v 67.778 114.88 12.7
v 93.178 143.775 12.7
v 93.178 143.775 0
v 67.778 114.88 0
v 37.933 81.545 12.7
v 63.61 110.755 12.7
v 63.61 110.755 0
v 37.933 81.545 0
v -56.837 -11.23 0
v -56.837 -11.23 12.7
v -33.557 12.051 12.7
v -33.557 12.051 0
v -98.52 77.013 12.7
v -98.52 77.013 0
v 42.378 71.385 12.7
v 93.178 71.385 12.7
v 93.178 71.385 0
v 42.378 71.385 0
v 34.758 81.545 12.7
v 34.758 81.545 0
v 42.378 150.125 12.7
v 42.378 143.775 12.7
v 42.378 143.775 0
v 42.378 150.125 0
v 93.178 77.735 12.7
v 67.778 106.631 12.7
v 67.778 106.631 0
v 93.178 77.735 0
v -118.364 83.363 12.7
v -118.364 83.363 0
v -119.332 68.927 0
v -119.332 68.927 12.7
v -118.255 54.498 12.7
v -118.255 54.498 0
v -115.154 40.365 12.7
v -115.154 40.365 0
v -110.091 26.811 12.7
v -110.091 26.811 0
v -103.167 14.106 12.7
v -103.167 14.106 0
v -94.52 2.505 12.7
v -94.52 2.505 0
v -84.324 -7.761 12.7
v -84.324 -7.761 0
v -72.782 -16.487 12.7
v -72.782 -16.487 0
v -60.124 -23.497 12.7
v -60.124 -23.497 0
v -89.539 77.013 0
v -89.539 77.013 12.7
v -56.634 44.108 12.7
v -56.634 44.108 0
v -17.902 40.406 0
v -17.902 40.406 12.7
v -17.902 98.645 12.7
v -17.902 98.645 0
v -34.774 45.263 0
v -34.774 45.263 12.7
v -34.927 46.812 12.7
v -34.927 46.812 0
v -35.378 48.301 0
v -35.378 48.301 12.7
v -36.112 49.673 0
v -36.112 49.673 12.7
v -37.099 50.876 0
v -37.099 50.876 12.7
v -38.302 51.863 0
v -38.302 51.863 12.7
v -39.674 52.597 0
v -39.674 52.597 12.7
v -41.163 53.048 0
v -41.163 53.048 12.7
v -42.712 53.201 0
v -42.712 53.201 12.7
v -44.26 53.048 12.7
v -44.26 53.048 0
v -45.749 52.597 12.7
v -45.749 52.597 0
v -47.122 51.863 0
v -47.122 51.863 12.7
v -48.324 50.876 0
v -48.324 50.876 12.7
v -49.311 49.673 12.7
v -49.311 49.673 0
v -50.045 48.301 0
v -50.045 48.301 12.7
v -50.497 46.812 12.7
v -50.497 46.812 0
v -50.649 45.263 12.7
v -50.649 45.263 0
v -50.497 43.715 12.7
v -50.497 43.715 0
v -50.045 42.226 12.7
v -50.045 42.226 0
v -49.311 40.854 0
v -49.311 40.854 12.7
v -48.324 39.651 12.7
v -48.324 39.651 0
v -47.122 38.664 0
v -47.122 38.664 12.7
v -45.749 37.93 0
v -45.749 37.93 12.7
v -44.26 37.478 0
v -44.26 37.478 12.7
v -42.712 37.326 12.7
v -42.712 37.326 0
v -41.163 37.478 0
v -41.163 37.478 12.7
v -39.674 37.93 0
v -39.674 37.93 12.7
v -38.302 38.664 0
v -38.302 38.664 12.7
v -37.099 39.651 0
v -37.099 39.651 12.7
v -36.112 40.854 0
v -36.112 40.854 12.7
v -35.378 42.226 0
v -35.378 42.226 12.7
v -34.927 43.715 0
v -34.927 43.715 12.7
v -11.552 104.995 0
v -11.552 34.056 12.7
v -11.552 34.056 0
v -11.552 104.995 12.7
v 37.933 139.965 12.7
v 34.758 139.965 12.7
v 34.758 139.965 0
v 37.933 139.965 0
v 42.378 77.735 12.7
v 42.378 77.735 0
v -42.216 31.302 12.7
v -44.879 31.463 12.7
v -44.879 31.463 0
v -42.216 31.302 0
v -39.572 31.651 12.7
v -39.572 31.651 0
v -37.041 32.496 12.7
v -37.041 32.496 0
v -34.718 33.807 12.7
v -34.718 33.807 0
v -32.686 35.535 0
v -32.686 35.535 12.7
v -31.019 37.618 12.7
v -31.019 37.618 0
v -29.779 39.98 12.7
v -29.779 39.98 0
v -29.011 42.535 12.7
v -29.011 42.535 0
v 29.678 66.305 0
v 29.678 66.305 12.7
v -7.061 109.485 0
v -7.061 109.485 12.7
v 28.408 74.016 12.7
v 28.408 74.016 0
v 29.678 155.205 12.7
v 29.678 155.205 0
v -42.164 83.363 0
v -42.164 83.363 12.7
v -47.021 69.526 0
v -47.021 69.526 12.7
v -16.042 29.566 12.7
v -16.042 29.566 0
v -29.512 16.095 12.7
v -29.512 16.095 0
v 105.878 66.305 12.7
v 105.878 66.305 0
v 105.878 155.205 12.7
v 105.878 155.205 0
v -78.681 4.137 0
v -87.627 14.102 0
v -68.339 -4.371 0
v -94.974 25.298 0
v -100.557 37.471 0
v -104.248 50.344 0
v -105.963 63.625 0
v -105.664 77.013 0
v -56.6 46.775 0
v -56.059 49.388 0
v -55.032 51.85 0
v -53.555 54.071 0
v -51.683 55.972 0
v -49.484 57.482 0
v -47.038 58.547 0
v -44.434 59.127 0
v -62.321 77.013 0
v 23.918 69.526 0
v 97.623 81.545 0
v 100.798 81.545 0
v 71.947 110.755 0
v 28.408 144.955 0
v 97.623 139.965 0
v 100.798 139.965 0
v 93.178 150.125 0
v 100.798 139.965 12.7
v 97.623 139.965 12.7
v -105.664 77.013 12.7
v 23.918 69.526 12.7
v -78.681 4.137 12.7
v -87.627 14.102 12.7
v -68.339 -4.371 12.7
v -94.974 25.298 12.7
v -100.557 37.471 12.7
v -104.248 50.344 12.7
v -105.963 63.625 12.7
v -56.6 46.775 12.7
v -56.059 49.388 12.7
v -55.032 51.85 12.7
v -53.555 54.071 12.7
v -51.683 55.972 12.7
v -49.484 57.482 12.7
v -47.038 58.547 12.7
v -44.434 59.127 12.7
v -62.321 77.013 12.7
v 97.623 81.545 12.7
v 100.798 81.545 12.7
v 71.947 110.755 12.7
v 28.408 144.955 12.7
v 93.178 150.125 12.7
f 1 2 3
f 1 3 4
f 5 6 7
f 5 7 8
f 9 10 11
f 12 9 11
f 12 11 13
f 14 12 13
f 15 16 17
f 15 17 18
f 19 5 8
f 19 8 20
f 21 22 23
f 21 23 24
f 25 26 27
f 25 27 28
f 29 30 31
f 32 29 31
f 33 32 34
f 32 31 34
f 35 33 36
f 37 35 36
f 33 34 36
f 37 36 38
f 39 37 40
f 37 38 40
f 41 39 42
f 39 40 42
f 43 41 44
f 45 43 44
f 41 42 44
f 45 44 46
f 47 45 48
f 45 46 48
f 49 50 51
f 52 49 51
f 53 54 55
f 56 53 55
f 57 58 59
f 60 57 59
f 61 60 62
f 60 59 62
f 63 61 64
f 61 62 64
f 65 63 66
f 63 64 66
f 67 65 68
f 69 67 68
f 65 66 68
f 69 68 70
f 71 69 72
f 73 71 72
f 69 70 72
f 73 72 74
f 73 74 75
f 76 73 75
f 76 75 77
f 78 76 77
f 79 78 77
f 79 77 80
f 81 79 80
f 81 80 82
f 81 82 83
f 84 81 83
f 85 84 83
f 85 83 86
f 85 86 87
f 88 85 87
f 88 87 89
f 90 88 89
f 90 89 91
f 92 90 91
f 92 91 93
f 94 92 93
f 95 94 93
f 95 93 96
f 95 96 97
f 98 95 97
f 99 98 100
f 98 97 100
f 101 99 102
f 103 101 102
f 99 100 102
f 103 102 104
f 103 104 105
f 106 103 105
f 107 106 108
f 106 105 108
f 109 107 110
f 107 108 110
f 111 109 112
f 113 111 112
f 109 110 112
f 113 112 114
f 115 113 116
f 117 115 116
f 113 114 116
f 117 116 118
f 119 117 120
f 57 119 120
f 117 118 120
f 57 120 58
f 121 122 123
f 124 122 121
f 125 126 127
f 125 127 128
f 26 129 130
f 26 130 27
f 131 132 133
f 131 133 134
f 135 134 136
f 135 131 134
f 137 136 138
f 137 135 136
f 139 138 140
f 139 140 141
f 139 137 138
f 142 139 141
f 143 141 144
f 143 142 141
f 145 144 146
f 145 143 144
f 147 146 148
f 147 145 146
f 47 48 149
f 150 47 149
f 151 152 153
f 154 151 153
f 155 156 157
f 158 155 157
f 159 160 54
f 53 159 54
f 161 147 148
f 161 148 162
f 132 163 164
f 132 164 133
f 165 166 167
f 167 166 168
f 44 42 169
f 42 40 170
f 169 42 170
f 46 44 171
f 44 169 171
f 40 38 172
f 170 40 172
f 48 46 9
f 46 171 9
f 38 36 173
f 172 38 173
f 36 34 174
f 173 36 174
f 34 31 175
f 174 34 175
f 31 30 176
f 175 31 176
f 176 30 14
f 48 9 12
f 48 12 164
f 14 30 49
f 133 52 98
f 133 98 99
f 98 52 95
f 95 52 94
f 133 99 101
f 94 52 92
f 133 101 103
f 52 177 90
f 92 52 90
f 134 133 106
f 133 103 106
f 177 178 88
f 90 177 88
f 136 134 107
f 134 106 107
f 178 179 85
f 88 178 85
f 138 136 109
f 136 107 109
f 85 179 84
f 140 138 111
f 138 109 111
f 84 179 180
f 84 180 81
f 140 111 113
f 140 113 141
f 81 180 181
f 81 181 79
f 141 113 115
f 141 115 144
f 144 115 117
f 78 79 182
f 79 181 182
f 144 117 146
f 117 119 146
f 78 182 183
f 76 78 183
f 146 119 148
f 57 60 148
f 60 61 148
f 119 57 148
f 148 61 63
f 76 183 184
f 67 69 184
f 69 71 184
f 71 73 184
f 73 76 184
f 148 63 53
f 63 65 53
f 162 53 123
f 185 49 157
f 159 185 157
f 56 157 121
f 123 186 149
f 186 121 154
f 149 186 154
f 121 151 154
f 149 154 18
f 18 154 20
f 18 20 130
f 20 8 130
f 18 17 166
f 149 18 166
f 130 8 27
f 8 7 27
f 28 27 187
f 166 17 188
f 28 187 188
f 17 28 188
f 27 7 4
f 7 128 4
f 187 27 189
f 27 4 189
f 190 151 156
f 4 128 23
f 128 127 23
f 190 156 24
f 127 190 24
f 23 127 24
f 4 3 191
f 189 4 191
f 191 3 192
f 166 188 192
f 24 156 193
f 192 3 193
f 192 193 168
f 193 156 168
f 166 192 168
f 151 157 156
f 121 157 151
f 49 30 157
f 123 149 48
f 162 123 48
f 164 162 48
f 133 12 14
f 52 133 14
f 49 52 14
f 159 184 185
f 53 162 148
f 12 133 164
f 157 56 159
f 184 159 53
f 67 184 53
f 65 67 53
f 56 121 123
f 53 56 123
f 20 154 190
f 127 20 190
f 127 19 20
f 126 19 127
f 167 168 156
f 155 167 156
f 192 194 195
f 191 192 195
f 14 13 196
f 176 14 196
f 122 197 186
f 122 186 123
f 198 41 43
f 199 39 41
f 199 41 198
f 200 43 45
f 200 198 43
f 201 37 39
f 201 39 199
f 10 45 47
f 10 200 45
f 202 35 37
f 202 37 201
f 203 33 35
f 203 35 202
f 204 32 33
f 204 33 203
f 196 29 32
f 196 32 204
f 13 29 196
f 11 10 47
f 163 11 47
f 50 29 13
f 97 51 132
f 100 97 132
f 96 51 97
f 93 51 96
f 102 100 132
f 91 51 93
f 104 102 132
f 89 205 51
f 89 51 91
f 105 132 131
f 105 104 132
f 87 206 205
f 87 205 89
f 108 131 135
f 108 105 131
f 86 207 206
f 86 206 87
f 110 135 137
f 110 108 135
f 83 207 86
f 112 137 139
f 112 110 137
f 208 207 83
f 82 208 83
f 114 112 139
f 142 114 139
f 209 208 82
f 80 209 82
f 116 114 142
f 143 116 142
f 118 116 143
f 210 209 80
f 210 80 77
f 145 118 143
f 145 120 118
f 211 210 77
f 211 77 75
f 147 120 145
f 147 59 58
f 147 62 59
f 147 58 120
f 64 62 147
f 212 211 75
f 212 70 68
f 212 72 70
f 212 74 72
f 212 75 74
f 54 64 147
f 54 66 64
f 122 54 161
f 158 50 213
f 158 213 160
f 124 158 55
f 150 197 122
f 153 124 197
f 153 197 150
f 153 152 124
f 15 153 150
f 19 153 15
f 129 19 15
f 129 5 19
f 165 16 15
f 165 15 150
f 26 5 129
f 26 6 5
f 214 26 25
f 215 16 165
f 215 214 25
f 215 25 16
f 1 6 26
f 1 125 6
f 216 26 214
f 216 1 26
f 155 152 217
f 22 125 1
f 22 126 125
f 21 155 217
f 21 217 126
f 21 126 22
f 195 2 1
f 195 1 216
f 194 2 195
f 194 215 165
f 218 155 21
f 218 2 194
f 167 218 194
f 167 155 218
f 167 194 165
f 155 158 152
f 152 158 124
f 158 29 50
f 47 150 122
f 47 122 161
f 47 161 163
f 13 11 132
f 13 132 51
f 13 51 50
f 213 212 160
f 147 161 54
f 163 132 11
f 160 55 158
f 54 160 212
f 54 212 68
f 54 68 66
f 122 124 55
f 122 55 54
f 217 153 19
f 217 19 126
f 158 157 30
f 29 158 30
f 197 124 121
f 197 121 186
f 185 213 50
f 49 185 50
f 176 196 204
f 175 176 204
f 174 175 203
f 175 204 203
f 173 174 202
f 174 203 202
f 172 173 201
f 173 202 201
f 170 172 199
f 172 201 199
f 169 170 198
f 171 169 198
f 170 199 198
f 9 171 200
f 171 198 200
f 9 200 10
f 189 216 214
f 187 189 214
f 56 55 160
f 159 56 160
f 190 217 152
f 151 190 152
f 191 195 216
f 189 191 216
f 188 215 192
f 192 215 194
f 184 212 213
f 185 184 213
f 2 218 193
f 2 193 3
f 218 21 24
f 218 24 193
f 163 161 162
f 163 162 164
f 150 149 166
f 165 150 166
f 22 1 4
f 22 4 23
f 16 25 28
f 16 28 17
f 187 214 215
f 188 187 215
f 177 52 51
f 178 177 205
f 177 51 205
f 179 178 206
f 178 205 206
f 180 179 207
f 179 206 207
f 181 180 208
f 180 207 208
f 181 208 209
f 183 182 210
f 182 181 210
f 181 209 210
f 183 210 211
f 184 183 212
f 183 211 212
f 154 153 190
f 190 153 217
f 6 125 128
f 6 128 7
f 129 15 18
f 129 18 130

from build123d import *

# Parameters (mm, degrees)
BOSS_EXTRUDE1_DEPTH = 12.7
SKETCH2_R           = 7.9375
CUT_EXTRUDE1_DEPTH  = 25.4
CUT_EXTRUDE2_DEPTH  = 25.4
CUT_EXTRUDE3_DEPTH  = 25.4
CUT_EXTRUDE4_DEPTH  = 25.4
CUT_EXTRUDE5_DEPTH  = 25.4


with BuildPart() as part:
    # Sketch1 → Boss-Extrude1 (new body)
    with BuildSketch(Plane.XY):
        with BuildLine():
            Line((29.67833379, 155.20549492), (-42.163715178, 83.363445951))
            Line((-42.163715178, 83.363445951), (-118.363715178, 83.363445951))
            ThreePointArc((-118.363715178, 83.363445951), (-106.853658004, 20.335826766), (-60.124227421, -23.497066291))
            Line((-60.124227421, -23.497066291), (29.67833379, 66.30549492))
            Line((29.67833379, 66.30549492), (105.87833379, 66.30549492))
            Line((105.87833379, 66.30549492), (105.87833379, 155.20549492))
            Line((105.87833379, 155.20549492), (29.67833379, 155.20549492))
        make_face()
    extrude(amount=BOSS_EXTRUDE1_DEPTH)

    # Sketch2 → Cut-Extrude1 (cut)
    with BuildSketch(Plane.XY.offset(12.7)):
        with Locations((-42.71166621, 45.263445951)):
            Circle(SKETCH2_R)
    extrude(amount=-CUT_EXTRUDE1_DEPTH, mode=Mode.SUBTRACT)

    # Sketch3 → Cut-Extrude2 (cut)
    with BuildSketch(Plane.XY.offset(12.7)):
        Polygon((93.17833379, 143.77549492), (67.77833379, 114.880205391), (42.37833379, 143.77549492), (42.37833379, 150.12549492), (93.17833379, 150.12549492), align=None)
        Polygon((97.62333379, 139.96549492), (71.946691953, 110.75549492), (97.62333379, 81.54549492), (100.79833379, 81.54549492), (100.79833379, 139.96549492), align=None)
        Polygon((34.75833379, 139.96549492), (37.93333379, 139.96549492), (63.609975627, 110.75549492), (37.93333379, 81.54549492), (34.75833379, 81.54549492), align=None)
        Polygon((42.37833379, 71.38549492), (42.37833379, 77.73549492), (67.77833379, 106.630784448), (93.17833379, 77.73549492), (93.17833379, 71.38549492), align=None)
    extrude(amount=-CUT_EXTRUDE2_DEPTH, mode=Mode.SUBTRACT)

    # Sketch4 → Cut-Extrude3 (cut)
    with BuildSketch(Plane.XY.offset(12.7)):
        Polygon((-7.061410089, 109.48549492), (28.40833379, 74.015751041), (28.40833379, 144.955238799), align=None)
        Polygon((23.91820573, 69.52562298), (-11.551538149, 34.055879101), (-11.551538149, 104.995366859), align=None)
        Polygon((-17.901538149, 98.645366859), (-47.021282028, 69.52562298), (-17.901538149, 40.405879101), align=None)
    extrude(amount=-CUT_EXTRUDE3_DEPTH, mode=Mode.SUBTRACT)

    # Sketch5 → Cut-Extrude4 (cut)
    with BuildSketch(Plane.XY.offset(12.7)):
        with BuildLine():
            Line((-29.010735503, 42.534820334), (-16.04166621, 29.565751041))
            Line((-16.04166621, 29.565751041), (-29.512050392, 16.095366859))
            Line((-29.512050392, 16.095366859), (-44.879327107, 31.462643575))
            ThreePointArc((-44.879327107, 31.462643575), (-34.717771497, 33.806633684), (-29.010735503, 42.534820334))
        make_face()
        with BuildLine():
            Line((-44.434025607, 59.126864653), (-62.320606906, 77.013445951))
            Line((-62.320606906, 77.013445951), (-89.539393744, 77.013445951))
            Line((-89.539393744, 77.013445951), (-56.633788009, 44.107840216))
            ThreePointArc((-56.633788009, 44.107840216), (-53.555107626, 54.071435408), (-44.434025607, 59.126864653))
        make_face()
    extrude(amount=-CUT_EXTRUDE4_DEPTH, mode=Mode.SUBTRACT)

    # Sketch6 → Cut-Extrude5 (cut)
    with BuildSketch(Plane.XY.offset(12.7)):
        with BuildLine():
            Line((-56.837225548, -11.229808297), (-33.556810582, 12.050606669))
            Line((-33.556810582, 12.050606669), (-98.519649865, 77.013445951))
            Line((-98.519649865, 77.013445951), (-105.663715178, 77.013445951))
            ThreePointArc((-105.663715178, 77.013445951), (-94.97435542, 25.298160398), (-56.837225548, -11.229808297))
        make_face()
    extrude(amount=-CUT_EXTRUDE5_DEPTH, mode=Mode.SUBTRACT)


solid = part.part
